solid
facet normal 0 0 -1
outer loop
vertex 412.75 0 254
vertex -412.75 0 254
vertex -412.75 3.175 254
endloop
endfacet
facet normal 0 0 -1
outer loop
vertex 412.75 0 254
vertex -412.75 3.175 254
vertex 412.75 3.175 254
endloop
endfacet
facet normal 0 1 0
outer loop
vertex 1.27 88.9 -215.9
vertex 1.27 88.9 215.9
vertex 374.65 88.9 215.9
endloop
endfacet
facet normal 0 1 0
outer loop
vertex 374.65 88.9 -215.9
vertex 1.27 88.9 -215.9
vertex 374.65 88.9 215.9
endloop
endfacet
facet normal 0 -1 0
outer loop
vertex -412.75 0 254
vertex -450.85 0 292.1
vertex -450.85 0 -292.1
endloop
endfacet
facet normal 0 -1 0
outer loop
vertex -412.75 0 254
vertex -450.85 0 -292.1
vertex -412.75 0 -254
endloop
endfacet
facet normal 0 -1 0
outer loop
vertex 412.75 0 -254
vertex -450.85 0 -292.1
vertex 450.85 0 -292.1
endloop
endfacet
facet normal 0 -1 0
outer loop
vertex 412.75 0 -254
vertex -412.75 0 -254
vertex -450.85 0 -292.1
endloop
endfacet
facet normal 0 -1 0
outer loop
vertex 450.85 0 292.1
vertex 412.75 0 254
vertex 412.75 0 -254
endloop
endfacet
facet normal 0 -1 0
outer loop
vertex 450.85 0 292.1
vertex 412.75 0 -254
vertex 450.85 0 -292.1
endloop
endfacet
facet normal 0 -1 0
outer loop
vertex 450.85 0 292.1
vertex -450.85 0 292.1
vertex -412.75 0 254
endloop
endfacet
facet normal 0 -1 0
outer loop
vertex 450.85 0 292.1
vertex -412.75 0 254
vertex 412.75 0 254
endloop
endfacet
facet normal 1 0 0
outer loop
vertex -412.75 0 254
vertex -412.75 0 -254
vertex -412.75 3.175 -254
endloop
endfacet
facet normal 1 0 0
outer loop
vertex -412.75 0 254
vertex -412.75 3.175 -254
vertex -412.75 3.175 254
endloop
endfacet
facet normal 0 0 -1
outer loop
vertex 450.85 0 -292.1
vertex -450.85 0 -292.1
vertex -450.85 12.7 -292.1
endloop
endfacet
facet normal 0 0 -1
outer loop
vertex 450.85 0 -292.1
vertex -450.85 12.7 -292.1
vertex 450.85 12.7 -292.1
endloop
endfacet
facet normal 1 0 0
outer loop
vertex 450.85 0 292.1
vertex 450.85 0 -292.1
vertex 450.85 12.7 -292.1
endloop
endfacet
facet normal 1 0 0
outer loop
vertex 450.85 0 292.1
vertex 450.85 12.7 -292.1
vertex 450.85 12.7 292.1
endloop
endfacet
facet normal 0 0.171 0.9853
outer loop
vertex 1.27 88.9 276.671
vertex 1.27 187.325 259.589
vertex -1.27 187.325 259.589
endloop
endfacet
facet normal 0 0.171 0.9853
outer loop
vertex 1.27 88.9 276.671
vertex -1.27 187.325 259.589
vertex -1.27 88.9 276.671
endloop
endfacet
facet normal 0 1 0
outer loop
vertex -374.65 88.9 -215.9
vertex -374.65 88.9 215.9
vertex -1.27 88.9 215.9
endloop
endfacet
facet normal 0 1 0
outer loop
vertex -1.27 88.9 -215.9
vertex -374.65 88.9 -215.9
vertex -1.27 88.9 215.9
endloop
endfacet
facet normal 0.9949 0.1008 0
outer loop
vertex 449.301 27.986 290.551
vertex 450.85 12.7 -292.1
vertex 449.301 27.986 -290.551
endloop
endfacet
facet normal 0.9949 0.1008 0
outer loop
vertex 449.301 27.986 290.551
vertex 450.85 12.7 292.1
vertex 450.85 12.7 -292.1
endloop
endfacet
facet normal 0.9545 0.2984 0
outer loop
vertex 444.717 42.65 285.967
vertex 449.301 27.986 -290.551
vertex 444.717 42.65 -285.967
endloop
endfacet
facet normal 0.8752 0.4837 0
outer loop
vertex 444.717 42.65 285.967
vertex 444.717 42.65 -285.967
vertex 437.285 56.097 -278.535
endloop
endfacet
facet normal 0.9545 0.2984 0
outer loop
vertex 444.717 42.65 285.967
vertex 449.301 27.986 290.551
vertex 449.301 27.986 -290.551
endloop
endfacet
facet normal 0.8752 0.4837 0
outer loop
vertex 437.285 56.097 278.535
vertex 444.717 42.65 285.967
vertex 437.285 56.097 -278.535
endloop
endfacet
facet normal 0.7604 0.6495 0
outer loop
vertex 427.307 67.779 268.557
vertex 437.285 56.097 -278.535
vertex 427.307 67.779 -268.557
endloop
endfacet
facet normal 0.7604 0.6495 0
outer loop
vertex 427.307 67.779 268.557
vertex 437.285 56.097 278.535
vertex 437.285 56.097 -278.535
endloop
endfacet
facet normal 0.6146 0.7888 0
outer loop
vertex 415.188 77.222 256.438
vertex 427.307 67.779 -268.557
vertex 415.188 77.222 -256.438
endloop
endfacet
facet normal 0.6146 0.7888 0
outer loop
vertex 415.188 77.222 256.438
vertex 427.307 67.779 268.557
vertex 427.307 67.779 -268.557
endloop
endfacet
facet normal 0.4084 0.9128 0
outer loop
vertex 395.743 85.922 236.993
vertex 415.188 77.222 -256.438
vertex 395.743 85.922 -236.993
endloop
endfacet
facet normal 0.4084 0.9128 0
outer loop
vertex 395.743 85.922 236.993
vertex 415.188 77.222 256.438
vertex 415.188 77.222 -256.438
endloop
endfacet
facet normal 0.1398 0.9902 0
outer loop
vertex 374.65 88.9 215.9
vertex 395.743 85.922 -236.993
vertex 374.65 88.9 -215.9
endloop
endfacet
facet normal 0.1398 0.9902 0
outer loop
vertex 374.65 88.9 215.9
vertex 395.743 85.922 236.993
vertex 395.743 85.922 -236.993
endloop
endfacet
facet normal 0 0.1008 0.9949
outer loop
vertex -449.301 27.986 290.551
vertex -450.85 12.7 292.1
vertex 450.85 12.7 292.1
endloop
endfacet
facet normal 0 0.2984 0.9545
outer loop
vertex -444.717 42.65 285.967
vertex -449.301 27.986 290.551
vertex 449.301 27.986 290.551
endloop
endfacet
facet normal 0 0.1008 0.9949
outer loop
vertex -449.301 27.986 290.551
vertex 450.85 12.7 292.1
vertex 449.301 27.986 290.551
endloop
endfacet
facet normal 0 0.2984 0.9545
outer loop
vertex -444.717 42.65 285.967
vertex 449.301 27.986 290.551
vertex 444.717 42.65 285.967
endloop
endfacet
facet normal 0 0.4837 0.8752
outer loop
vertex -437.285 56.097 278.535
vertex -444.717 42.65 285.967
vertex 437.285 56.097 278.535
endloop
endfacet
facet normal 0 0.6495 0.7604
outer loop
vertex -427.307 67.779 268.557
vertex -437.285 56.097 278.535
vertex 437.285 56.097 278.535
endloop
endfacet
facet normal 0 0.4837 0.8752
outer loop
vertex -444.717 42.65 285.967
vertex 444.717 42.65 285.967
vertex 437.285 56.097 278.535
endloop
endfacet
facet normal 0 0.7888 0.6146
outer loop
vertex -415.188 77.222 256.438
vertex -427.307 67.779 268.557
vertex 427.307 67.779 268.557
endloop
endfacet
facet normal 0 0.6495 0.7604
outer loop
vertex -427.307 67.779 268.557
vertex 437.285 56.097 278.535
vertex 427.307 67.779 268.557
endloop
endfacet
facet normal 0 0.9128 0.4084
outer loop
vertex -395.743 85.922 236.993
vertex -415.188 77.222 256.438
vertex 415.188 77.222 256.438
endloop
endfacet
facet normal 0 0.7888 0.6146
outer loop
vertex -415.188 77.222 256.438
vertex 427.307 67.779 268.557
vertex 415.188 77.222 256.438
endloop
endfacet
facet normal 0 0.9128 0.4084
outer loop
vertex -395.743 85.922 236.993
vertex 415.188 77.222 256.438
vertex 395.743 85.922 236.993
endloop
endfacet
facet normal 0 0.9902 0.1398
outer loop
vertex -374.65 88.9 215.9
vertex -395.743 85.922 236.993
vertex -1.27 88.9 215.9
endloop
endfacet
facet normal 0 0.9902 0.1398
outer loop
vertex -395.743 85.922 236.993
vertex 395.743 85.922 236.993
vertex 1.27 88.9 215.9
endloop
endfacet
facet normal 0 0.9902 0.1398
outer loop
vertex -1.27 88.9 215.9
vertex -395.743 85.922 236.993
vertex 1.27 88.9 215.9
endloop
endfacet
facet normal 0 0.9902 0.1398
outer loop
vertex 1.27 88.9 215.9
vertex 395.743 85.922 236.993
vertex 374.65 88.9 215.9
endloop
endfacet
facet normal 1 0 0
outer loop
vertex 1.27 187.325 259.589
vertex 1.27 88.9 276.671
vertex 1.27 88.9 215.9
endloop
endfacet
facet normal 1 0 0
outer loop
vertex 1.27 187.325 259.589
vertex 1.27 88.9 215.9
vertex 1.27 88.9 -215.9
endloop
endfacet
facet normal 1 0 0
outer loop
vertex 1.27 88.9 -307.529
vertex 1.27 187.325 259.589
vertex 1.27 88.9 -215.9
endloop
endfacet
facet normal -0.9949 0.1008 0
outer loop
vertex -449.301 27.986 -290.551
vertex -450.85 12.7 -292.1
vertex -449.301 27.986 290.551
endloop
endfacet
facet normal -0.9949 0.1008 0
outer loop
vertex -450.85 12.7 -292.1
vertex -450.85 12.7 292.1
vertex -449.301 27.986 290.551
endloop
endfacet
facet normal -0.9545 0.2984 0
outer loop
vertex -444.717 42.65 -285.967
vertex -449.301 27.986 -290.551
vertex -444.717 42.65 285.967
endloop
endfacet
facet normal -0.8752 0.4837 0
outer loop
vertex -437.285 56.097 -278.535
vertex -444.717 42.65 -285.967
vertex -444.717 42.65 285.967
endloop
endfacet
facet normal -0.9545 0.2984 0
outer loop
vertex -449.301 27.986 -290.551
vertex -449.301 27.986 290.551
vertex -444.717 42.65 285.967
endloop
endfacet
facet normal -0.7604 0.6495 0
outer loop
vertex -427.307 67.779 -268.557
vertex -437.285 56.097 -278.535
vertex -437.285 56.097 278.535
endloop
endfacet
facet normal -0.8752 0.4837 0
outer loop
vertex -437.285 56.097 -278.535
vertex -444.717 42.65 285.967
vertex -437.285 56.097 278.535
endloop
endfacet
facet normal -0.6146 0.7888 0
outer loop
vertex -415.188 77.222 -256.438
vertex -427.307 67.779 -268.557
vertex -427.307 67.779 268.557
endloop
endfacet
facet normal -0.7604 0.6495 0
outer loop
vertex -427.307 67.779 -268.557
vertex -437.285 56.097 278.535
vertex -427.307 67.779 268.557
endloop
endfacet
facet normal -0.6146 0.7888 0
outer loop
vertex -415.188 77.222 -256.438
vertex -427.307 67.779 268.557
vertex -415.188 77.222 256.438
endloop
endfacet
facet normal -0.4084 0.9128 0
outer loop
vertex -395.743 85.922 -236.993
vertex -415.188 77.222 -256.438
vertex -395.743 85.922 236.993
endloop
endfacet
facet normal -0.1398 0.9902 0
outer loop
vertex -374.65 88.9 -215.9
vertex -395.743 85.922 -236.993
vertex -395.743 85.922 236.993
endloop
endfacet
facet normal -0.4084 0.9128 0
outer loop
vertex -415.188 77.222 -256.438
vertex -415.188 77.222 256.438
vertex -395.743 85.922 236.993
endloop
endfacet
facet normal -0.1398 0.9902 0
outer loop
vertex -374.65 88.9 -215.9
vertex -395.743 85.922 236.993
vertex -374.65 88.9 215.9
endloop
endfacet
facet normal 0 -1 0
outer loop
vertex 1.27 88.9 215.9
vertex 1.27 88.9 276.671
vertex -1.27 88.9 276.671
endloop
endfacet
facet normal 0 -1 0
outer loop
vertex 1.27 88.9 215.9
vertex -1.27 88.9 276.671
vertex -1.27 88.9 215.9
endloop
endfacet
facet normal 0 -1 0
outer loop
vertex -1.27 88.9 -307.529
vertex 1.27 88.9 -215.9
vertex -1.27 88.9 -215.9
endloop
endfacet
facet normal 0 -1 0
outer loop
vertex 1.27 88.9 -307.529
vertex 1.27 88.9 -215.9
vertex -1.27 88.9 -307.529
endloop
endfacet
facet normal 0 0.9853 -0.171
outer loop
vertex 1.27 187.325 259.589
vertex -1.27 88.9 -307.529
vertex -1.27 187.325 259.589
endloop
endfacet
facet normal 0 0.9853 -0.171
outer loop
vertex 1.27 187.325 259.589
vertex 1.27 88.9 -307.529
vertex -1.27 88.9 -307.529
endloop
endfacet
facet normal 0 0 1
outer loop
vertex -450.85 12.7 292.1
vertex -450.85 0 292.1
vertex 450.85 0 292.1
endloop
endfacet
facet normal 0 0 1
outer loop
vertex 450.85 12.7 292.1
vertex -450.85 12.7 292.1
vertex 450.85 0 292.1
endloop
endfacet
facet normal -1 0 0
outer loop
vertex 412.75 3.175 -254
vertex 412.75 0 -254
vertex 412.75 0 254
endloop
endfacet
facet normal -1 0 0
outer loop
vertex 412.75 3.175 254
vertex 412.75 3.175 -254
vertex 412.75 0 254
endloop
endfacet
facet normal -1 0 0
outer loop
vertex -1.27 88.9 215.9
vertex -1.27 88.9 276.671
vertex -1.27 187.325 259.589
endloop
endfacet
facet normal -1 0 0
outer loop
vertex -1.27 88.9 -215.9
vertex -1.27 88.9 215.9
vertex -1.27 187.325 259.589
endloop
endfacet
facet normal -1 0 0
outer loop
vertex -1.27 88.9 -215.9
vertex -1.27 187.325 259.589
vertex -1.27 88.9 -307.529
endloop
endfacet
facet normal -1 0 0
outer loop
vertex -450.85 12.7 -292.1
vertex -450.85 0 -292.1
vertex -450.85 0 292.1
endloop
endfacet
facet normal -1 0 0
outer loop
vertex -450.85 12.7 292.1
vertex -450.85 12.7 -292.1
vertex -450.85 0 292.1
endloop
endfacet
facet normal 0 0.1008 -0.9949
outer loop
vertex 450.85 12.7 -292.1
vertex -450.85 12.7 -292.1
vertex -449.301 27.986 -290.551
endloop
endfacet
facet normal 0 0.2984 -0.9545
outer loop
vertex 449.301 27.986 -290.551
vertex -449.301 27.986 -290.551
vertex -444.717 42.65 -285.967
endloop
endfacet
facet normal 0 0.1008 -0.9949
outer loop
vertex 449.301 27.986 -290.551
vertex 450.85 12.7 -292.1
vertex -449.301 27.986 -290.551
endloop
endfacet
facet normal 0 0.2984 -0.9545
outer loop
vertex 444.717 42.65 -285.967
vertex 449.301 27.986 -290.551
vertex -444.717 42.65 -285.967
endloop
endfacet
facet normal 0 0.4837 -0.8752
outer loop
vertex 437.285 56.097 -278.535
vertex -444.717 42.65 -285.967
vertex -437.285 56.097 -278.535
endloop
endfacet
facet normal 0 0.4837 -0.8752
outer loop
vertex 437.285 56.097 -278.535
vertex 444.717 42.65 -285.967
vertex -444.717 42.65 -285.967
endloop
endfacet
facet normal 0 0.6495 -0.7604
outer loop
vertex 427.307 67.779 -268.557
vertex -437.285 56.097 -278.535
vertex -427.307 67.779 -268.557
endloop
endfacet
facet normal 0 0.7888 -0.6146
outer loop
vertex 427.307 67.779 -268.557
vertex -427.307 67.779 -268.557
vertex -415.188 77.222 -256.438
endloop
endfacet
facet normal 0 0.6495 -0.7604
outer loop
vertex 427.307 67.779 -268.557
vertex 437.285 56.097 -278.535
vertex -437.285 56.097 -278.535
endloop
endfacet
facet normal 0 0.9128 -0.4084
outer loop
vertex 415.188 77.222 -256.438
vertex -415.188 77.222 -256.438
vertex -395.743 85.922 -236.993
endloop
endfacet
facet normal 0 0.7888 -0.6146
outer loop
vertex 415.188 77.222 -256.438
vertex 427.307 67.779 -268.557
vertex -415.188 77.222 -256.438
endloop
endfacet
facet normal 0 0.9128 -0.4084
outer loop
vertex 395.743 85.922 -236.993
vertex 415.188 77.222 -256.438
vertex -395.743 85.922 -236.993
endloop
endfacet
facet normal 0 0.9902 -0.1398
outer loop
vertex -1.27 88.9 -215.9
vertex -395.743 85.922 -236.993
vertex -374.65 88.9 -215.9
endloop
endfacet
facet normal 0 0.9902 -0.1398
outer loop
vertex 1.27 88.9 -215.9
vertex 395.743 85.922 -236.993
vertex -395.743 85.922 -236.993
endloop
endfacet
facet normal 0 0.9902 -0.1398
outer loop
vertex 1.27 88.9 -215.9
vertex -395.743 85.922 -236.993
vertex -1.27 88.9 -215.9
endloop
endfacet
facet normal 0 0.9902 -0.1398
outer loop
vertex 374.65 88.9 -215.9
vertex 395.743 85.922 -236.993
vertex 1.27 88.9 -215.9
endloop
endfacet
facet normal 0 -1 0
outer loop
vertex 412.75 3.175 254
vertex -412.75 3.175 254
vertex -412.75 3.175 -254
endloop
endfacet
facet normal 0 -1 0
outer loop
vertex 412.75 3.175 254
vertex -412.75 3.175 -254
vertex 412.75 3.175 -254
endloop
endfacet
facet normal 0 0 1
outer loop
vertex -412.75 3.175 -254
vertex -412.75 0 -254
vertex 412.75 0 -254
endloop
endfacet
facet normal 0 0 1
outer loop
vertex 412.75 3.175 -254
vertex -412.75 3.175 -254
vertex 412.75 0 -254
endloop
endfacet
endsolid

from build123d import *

# Parameters (mm, degrees)
F0_W     = 901.7
F0_H     = 584.2
F1_DEPTH = 88.9
F2_R     = 76.2
F3_W     = 825.5
F3_H     = 508
F4_DEPTH = 3.175
F6_DEPTH = 1.27


with BuildPart() as f1:
    # F0 (on Front) → F1 (new body)
    with BuildSketch(Plane.XZ):
        Rectangle(F0_W, F0_H)
    extrude(amount=-F1_DEPTH)

    # F2
    f2_edges = [f1.edges().sort_by_distance(p)[0] for p in [
        (0, 88.9, 292.1),
        (-450.85, 88.9, 0),
        (0, 88.9, -292.1),
        (450.85, 88.9, 0),
    ]]
    fillet(f2_edges, radius=F2_R)

    # F3 (on face) → F4 (cut)
    with BuildSketch(Plane.XZ):
        Rectangle(F3_W, F3_H)
    extrude(amount=-F4_DEPTH, mode=Mode.SUBTRACT)

    # F5 (on Right) → F6 (join, symmetric)
    with BuildSketch(Plane.YZ):
        Polygon((88.9, -307.528856), (187.325, 259.589197), (88.9, 276.671144), align=None)
    extrude(amount=F6_DEPTH, both=True)


solid = f1.part
